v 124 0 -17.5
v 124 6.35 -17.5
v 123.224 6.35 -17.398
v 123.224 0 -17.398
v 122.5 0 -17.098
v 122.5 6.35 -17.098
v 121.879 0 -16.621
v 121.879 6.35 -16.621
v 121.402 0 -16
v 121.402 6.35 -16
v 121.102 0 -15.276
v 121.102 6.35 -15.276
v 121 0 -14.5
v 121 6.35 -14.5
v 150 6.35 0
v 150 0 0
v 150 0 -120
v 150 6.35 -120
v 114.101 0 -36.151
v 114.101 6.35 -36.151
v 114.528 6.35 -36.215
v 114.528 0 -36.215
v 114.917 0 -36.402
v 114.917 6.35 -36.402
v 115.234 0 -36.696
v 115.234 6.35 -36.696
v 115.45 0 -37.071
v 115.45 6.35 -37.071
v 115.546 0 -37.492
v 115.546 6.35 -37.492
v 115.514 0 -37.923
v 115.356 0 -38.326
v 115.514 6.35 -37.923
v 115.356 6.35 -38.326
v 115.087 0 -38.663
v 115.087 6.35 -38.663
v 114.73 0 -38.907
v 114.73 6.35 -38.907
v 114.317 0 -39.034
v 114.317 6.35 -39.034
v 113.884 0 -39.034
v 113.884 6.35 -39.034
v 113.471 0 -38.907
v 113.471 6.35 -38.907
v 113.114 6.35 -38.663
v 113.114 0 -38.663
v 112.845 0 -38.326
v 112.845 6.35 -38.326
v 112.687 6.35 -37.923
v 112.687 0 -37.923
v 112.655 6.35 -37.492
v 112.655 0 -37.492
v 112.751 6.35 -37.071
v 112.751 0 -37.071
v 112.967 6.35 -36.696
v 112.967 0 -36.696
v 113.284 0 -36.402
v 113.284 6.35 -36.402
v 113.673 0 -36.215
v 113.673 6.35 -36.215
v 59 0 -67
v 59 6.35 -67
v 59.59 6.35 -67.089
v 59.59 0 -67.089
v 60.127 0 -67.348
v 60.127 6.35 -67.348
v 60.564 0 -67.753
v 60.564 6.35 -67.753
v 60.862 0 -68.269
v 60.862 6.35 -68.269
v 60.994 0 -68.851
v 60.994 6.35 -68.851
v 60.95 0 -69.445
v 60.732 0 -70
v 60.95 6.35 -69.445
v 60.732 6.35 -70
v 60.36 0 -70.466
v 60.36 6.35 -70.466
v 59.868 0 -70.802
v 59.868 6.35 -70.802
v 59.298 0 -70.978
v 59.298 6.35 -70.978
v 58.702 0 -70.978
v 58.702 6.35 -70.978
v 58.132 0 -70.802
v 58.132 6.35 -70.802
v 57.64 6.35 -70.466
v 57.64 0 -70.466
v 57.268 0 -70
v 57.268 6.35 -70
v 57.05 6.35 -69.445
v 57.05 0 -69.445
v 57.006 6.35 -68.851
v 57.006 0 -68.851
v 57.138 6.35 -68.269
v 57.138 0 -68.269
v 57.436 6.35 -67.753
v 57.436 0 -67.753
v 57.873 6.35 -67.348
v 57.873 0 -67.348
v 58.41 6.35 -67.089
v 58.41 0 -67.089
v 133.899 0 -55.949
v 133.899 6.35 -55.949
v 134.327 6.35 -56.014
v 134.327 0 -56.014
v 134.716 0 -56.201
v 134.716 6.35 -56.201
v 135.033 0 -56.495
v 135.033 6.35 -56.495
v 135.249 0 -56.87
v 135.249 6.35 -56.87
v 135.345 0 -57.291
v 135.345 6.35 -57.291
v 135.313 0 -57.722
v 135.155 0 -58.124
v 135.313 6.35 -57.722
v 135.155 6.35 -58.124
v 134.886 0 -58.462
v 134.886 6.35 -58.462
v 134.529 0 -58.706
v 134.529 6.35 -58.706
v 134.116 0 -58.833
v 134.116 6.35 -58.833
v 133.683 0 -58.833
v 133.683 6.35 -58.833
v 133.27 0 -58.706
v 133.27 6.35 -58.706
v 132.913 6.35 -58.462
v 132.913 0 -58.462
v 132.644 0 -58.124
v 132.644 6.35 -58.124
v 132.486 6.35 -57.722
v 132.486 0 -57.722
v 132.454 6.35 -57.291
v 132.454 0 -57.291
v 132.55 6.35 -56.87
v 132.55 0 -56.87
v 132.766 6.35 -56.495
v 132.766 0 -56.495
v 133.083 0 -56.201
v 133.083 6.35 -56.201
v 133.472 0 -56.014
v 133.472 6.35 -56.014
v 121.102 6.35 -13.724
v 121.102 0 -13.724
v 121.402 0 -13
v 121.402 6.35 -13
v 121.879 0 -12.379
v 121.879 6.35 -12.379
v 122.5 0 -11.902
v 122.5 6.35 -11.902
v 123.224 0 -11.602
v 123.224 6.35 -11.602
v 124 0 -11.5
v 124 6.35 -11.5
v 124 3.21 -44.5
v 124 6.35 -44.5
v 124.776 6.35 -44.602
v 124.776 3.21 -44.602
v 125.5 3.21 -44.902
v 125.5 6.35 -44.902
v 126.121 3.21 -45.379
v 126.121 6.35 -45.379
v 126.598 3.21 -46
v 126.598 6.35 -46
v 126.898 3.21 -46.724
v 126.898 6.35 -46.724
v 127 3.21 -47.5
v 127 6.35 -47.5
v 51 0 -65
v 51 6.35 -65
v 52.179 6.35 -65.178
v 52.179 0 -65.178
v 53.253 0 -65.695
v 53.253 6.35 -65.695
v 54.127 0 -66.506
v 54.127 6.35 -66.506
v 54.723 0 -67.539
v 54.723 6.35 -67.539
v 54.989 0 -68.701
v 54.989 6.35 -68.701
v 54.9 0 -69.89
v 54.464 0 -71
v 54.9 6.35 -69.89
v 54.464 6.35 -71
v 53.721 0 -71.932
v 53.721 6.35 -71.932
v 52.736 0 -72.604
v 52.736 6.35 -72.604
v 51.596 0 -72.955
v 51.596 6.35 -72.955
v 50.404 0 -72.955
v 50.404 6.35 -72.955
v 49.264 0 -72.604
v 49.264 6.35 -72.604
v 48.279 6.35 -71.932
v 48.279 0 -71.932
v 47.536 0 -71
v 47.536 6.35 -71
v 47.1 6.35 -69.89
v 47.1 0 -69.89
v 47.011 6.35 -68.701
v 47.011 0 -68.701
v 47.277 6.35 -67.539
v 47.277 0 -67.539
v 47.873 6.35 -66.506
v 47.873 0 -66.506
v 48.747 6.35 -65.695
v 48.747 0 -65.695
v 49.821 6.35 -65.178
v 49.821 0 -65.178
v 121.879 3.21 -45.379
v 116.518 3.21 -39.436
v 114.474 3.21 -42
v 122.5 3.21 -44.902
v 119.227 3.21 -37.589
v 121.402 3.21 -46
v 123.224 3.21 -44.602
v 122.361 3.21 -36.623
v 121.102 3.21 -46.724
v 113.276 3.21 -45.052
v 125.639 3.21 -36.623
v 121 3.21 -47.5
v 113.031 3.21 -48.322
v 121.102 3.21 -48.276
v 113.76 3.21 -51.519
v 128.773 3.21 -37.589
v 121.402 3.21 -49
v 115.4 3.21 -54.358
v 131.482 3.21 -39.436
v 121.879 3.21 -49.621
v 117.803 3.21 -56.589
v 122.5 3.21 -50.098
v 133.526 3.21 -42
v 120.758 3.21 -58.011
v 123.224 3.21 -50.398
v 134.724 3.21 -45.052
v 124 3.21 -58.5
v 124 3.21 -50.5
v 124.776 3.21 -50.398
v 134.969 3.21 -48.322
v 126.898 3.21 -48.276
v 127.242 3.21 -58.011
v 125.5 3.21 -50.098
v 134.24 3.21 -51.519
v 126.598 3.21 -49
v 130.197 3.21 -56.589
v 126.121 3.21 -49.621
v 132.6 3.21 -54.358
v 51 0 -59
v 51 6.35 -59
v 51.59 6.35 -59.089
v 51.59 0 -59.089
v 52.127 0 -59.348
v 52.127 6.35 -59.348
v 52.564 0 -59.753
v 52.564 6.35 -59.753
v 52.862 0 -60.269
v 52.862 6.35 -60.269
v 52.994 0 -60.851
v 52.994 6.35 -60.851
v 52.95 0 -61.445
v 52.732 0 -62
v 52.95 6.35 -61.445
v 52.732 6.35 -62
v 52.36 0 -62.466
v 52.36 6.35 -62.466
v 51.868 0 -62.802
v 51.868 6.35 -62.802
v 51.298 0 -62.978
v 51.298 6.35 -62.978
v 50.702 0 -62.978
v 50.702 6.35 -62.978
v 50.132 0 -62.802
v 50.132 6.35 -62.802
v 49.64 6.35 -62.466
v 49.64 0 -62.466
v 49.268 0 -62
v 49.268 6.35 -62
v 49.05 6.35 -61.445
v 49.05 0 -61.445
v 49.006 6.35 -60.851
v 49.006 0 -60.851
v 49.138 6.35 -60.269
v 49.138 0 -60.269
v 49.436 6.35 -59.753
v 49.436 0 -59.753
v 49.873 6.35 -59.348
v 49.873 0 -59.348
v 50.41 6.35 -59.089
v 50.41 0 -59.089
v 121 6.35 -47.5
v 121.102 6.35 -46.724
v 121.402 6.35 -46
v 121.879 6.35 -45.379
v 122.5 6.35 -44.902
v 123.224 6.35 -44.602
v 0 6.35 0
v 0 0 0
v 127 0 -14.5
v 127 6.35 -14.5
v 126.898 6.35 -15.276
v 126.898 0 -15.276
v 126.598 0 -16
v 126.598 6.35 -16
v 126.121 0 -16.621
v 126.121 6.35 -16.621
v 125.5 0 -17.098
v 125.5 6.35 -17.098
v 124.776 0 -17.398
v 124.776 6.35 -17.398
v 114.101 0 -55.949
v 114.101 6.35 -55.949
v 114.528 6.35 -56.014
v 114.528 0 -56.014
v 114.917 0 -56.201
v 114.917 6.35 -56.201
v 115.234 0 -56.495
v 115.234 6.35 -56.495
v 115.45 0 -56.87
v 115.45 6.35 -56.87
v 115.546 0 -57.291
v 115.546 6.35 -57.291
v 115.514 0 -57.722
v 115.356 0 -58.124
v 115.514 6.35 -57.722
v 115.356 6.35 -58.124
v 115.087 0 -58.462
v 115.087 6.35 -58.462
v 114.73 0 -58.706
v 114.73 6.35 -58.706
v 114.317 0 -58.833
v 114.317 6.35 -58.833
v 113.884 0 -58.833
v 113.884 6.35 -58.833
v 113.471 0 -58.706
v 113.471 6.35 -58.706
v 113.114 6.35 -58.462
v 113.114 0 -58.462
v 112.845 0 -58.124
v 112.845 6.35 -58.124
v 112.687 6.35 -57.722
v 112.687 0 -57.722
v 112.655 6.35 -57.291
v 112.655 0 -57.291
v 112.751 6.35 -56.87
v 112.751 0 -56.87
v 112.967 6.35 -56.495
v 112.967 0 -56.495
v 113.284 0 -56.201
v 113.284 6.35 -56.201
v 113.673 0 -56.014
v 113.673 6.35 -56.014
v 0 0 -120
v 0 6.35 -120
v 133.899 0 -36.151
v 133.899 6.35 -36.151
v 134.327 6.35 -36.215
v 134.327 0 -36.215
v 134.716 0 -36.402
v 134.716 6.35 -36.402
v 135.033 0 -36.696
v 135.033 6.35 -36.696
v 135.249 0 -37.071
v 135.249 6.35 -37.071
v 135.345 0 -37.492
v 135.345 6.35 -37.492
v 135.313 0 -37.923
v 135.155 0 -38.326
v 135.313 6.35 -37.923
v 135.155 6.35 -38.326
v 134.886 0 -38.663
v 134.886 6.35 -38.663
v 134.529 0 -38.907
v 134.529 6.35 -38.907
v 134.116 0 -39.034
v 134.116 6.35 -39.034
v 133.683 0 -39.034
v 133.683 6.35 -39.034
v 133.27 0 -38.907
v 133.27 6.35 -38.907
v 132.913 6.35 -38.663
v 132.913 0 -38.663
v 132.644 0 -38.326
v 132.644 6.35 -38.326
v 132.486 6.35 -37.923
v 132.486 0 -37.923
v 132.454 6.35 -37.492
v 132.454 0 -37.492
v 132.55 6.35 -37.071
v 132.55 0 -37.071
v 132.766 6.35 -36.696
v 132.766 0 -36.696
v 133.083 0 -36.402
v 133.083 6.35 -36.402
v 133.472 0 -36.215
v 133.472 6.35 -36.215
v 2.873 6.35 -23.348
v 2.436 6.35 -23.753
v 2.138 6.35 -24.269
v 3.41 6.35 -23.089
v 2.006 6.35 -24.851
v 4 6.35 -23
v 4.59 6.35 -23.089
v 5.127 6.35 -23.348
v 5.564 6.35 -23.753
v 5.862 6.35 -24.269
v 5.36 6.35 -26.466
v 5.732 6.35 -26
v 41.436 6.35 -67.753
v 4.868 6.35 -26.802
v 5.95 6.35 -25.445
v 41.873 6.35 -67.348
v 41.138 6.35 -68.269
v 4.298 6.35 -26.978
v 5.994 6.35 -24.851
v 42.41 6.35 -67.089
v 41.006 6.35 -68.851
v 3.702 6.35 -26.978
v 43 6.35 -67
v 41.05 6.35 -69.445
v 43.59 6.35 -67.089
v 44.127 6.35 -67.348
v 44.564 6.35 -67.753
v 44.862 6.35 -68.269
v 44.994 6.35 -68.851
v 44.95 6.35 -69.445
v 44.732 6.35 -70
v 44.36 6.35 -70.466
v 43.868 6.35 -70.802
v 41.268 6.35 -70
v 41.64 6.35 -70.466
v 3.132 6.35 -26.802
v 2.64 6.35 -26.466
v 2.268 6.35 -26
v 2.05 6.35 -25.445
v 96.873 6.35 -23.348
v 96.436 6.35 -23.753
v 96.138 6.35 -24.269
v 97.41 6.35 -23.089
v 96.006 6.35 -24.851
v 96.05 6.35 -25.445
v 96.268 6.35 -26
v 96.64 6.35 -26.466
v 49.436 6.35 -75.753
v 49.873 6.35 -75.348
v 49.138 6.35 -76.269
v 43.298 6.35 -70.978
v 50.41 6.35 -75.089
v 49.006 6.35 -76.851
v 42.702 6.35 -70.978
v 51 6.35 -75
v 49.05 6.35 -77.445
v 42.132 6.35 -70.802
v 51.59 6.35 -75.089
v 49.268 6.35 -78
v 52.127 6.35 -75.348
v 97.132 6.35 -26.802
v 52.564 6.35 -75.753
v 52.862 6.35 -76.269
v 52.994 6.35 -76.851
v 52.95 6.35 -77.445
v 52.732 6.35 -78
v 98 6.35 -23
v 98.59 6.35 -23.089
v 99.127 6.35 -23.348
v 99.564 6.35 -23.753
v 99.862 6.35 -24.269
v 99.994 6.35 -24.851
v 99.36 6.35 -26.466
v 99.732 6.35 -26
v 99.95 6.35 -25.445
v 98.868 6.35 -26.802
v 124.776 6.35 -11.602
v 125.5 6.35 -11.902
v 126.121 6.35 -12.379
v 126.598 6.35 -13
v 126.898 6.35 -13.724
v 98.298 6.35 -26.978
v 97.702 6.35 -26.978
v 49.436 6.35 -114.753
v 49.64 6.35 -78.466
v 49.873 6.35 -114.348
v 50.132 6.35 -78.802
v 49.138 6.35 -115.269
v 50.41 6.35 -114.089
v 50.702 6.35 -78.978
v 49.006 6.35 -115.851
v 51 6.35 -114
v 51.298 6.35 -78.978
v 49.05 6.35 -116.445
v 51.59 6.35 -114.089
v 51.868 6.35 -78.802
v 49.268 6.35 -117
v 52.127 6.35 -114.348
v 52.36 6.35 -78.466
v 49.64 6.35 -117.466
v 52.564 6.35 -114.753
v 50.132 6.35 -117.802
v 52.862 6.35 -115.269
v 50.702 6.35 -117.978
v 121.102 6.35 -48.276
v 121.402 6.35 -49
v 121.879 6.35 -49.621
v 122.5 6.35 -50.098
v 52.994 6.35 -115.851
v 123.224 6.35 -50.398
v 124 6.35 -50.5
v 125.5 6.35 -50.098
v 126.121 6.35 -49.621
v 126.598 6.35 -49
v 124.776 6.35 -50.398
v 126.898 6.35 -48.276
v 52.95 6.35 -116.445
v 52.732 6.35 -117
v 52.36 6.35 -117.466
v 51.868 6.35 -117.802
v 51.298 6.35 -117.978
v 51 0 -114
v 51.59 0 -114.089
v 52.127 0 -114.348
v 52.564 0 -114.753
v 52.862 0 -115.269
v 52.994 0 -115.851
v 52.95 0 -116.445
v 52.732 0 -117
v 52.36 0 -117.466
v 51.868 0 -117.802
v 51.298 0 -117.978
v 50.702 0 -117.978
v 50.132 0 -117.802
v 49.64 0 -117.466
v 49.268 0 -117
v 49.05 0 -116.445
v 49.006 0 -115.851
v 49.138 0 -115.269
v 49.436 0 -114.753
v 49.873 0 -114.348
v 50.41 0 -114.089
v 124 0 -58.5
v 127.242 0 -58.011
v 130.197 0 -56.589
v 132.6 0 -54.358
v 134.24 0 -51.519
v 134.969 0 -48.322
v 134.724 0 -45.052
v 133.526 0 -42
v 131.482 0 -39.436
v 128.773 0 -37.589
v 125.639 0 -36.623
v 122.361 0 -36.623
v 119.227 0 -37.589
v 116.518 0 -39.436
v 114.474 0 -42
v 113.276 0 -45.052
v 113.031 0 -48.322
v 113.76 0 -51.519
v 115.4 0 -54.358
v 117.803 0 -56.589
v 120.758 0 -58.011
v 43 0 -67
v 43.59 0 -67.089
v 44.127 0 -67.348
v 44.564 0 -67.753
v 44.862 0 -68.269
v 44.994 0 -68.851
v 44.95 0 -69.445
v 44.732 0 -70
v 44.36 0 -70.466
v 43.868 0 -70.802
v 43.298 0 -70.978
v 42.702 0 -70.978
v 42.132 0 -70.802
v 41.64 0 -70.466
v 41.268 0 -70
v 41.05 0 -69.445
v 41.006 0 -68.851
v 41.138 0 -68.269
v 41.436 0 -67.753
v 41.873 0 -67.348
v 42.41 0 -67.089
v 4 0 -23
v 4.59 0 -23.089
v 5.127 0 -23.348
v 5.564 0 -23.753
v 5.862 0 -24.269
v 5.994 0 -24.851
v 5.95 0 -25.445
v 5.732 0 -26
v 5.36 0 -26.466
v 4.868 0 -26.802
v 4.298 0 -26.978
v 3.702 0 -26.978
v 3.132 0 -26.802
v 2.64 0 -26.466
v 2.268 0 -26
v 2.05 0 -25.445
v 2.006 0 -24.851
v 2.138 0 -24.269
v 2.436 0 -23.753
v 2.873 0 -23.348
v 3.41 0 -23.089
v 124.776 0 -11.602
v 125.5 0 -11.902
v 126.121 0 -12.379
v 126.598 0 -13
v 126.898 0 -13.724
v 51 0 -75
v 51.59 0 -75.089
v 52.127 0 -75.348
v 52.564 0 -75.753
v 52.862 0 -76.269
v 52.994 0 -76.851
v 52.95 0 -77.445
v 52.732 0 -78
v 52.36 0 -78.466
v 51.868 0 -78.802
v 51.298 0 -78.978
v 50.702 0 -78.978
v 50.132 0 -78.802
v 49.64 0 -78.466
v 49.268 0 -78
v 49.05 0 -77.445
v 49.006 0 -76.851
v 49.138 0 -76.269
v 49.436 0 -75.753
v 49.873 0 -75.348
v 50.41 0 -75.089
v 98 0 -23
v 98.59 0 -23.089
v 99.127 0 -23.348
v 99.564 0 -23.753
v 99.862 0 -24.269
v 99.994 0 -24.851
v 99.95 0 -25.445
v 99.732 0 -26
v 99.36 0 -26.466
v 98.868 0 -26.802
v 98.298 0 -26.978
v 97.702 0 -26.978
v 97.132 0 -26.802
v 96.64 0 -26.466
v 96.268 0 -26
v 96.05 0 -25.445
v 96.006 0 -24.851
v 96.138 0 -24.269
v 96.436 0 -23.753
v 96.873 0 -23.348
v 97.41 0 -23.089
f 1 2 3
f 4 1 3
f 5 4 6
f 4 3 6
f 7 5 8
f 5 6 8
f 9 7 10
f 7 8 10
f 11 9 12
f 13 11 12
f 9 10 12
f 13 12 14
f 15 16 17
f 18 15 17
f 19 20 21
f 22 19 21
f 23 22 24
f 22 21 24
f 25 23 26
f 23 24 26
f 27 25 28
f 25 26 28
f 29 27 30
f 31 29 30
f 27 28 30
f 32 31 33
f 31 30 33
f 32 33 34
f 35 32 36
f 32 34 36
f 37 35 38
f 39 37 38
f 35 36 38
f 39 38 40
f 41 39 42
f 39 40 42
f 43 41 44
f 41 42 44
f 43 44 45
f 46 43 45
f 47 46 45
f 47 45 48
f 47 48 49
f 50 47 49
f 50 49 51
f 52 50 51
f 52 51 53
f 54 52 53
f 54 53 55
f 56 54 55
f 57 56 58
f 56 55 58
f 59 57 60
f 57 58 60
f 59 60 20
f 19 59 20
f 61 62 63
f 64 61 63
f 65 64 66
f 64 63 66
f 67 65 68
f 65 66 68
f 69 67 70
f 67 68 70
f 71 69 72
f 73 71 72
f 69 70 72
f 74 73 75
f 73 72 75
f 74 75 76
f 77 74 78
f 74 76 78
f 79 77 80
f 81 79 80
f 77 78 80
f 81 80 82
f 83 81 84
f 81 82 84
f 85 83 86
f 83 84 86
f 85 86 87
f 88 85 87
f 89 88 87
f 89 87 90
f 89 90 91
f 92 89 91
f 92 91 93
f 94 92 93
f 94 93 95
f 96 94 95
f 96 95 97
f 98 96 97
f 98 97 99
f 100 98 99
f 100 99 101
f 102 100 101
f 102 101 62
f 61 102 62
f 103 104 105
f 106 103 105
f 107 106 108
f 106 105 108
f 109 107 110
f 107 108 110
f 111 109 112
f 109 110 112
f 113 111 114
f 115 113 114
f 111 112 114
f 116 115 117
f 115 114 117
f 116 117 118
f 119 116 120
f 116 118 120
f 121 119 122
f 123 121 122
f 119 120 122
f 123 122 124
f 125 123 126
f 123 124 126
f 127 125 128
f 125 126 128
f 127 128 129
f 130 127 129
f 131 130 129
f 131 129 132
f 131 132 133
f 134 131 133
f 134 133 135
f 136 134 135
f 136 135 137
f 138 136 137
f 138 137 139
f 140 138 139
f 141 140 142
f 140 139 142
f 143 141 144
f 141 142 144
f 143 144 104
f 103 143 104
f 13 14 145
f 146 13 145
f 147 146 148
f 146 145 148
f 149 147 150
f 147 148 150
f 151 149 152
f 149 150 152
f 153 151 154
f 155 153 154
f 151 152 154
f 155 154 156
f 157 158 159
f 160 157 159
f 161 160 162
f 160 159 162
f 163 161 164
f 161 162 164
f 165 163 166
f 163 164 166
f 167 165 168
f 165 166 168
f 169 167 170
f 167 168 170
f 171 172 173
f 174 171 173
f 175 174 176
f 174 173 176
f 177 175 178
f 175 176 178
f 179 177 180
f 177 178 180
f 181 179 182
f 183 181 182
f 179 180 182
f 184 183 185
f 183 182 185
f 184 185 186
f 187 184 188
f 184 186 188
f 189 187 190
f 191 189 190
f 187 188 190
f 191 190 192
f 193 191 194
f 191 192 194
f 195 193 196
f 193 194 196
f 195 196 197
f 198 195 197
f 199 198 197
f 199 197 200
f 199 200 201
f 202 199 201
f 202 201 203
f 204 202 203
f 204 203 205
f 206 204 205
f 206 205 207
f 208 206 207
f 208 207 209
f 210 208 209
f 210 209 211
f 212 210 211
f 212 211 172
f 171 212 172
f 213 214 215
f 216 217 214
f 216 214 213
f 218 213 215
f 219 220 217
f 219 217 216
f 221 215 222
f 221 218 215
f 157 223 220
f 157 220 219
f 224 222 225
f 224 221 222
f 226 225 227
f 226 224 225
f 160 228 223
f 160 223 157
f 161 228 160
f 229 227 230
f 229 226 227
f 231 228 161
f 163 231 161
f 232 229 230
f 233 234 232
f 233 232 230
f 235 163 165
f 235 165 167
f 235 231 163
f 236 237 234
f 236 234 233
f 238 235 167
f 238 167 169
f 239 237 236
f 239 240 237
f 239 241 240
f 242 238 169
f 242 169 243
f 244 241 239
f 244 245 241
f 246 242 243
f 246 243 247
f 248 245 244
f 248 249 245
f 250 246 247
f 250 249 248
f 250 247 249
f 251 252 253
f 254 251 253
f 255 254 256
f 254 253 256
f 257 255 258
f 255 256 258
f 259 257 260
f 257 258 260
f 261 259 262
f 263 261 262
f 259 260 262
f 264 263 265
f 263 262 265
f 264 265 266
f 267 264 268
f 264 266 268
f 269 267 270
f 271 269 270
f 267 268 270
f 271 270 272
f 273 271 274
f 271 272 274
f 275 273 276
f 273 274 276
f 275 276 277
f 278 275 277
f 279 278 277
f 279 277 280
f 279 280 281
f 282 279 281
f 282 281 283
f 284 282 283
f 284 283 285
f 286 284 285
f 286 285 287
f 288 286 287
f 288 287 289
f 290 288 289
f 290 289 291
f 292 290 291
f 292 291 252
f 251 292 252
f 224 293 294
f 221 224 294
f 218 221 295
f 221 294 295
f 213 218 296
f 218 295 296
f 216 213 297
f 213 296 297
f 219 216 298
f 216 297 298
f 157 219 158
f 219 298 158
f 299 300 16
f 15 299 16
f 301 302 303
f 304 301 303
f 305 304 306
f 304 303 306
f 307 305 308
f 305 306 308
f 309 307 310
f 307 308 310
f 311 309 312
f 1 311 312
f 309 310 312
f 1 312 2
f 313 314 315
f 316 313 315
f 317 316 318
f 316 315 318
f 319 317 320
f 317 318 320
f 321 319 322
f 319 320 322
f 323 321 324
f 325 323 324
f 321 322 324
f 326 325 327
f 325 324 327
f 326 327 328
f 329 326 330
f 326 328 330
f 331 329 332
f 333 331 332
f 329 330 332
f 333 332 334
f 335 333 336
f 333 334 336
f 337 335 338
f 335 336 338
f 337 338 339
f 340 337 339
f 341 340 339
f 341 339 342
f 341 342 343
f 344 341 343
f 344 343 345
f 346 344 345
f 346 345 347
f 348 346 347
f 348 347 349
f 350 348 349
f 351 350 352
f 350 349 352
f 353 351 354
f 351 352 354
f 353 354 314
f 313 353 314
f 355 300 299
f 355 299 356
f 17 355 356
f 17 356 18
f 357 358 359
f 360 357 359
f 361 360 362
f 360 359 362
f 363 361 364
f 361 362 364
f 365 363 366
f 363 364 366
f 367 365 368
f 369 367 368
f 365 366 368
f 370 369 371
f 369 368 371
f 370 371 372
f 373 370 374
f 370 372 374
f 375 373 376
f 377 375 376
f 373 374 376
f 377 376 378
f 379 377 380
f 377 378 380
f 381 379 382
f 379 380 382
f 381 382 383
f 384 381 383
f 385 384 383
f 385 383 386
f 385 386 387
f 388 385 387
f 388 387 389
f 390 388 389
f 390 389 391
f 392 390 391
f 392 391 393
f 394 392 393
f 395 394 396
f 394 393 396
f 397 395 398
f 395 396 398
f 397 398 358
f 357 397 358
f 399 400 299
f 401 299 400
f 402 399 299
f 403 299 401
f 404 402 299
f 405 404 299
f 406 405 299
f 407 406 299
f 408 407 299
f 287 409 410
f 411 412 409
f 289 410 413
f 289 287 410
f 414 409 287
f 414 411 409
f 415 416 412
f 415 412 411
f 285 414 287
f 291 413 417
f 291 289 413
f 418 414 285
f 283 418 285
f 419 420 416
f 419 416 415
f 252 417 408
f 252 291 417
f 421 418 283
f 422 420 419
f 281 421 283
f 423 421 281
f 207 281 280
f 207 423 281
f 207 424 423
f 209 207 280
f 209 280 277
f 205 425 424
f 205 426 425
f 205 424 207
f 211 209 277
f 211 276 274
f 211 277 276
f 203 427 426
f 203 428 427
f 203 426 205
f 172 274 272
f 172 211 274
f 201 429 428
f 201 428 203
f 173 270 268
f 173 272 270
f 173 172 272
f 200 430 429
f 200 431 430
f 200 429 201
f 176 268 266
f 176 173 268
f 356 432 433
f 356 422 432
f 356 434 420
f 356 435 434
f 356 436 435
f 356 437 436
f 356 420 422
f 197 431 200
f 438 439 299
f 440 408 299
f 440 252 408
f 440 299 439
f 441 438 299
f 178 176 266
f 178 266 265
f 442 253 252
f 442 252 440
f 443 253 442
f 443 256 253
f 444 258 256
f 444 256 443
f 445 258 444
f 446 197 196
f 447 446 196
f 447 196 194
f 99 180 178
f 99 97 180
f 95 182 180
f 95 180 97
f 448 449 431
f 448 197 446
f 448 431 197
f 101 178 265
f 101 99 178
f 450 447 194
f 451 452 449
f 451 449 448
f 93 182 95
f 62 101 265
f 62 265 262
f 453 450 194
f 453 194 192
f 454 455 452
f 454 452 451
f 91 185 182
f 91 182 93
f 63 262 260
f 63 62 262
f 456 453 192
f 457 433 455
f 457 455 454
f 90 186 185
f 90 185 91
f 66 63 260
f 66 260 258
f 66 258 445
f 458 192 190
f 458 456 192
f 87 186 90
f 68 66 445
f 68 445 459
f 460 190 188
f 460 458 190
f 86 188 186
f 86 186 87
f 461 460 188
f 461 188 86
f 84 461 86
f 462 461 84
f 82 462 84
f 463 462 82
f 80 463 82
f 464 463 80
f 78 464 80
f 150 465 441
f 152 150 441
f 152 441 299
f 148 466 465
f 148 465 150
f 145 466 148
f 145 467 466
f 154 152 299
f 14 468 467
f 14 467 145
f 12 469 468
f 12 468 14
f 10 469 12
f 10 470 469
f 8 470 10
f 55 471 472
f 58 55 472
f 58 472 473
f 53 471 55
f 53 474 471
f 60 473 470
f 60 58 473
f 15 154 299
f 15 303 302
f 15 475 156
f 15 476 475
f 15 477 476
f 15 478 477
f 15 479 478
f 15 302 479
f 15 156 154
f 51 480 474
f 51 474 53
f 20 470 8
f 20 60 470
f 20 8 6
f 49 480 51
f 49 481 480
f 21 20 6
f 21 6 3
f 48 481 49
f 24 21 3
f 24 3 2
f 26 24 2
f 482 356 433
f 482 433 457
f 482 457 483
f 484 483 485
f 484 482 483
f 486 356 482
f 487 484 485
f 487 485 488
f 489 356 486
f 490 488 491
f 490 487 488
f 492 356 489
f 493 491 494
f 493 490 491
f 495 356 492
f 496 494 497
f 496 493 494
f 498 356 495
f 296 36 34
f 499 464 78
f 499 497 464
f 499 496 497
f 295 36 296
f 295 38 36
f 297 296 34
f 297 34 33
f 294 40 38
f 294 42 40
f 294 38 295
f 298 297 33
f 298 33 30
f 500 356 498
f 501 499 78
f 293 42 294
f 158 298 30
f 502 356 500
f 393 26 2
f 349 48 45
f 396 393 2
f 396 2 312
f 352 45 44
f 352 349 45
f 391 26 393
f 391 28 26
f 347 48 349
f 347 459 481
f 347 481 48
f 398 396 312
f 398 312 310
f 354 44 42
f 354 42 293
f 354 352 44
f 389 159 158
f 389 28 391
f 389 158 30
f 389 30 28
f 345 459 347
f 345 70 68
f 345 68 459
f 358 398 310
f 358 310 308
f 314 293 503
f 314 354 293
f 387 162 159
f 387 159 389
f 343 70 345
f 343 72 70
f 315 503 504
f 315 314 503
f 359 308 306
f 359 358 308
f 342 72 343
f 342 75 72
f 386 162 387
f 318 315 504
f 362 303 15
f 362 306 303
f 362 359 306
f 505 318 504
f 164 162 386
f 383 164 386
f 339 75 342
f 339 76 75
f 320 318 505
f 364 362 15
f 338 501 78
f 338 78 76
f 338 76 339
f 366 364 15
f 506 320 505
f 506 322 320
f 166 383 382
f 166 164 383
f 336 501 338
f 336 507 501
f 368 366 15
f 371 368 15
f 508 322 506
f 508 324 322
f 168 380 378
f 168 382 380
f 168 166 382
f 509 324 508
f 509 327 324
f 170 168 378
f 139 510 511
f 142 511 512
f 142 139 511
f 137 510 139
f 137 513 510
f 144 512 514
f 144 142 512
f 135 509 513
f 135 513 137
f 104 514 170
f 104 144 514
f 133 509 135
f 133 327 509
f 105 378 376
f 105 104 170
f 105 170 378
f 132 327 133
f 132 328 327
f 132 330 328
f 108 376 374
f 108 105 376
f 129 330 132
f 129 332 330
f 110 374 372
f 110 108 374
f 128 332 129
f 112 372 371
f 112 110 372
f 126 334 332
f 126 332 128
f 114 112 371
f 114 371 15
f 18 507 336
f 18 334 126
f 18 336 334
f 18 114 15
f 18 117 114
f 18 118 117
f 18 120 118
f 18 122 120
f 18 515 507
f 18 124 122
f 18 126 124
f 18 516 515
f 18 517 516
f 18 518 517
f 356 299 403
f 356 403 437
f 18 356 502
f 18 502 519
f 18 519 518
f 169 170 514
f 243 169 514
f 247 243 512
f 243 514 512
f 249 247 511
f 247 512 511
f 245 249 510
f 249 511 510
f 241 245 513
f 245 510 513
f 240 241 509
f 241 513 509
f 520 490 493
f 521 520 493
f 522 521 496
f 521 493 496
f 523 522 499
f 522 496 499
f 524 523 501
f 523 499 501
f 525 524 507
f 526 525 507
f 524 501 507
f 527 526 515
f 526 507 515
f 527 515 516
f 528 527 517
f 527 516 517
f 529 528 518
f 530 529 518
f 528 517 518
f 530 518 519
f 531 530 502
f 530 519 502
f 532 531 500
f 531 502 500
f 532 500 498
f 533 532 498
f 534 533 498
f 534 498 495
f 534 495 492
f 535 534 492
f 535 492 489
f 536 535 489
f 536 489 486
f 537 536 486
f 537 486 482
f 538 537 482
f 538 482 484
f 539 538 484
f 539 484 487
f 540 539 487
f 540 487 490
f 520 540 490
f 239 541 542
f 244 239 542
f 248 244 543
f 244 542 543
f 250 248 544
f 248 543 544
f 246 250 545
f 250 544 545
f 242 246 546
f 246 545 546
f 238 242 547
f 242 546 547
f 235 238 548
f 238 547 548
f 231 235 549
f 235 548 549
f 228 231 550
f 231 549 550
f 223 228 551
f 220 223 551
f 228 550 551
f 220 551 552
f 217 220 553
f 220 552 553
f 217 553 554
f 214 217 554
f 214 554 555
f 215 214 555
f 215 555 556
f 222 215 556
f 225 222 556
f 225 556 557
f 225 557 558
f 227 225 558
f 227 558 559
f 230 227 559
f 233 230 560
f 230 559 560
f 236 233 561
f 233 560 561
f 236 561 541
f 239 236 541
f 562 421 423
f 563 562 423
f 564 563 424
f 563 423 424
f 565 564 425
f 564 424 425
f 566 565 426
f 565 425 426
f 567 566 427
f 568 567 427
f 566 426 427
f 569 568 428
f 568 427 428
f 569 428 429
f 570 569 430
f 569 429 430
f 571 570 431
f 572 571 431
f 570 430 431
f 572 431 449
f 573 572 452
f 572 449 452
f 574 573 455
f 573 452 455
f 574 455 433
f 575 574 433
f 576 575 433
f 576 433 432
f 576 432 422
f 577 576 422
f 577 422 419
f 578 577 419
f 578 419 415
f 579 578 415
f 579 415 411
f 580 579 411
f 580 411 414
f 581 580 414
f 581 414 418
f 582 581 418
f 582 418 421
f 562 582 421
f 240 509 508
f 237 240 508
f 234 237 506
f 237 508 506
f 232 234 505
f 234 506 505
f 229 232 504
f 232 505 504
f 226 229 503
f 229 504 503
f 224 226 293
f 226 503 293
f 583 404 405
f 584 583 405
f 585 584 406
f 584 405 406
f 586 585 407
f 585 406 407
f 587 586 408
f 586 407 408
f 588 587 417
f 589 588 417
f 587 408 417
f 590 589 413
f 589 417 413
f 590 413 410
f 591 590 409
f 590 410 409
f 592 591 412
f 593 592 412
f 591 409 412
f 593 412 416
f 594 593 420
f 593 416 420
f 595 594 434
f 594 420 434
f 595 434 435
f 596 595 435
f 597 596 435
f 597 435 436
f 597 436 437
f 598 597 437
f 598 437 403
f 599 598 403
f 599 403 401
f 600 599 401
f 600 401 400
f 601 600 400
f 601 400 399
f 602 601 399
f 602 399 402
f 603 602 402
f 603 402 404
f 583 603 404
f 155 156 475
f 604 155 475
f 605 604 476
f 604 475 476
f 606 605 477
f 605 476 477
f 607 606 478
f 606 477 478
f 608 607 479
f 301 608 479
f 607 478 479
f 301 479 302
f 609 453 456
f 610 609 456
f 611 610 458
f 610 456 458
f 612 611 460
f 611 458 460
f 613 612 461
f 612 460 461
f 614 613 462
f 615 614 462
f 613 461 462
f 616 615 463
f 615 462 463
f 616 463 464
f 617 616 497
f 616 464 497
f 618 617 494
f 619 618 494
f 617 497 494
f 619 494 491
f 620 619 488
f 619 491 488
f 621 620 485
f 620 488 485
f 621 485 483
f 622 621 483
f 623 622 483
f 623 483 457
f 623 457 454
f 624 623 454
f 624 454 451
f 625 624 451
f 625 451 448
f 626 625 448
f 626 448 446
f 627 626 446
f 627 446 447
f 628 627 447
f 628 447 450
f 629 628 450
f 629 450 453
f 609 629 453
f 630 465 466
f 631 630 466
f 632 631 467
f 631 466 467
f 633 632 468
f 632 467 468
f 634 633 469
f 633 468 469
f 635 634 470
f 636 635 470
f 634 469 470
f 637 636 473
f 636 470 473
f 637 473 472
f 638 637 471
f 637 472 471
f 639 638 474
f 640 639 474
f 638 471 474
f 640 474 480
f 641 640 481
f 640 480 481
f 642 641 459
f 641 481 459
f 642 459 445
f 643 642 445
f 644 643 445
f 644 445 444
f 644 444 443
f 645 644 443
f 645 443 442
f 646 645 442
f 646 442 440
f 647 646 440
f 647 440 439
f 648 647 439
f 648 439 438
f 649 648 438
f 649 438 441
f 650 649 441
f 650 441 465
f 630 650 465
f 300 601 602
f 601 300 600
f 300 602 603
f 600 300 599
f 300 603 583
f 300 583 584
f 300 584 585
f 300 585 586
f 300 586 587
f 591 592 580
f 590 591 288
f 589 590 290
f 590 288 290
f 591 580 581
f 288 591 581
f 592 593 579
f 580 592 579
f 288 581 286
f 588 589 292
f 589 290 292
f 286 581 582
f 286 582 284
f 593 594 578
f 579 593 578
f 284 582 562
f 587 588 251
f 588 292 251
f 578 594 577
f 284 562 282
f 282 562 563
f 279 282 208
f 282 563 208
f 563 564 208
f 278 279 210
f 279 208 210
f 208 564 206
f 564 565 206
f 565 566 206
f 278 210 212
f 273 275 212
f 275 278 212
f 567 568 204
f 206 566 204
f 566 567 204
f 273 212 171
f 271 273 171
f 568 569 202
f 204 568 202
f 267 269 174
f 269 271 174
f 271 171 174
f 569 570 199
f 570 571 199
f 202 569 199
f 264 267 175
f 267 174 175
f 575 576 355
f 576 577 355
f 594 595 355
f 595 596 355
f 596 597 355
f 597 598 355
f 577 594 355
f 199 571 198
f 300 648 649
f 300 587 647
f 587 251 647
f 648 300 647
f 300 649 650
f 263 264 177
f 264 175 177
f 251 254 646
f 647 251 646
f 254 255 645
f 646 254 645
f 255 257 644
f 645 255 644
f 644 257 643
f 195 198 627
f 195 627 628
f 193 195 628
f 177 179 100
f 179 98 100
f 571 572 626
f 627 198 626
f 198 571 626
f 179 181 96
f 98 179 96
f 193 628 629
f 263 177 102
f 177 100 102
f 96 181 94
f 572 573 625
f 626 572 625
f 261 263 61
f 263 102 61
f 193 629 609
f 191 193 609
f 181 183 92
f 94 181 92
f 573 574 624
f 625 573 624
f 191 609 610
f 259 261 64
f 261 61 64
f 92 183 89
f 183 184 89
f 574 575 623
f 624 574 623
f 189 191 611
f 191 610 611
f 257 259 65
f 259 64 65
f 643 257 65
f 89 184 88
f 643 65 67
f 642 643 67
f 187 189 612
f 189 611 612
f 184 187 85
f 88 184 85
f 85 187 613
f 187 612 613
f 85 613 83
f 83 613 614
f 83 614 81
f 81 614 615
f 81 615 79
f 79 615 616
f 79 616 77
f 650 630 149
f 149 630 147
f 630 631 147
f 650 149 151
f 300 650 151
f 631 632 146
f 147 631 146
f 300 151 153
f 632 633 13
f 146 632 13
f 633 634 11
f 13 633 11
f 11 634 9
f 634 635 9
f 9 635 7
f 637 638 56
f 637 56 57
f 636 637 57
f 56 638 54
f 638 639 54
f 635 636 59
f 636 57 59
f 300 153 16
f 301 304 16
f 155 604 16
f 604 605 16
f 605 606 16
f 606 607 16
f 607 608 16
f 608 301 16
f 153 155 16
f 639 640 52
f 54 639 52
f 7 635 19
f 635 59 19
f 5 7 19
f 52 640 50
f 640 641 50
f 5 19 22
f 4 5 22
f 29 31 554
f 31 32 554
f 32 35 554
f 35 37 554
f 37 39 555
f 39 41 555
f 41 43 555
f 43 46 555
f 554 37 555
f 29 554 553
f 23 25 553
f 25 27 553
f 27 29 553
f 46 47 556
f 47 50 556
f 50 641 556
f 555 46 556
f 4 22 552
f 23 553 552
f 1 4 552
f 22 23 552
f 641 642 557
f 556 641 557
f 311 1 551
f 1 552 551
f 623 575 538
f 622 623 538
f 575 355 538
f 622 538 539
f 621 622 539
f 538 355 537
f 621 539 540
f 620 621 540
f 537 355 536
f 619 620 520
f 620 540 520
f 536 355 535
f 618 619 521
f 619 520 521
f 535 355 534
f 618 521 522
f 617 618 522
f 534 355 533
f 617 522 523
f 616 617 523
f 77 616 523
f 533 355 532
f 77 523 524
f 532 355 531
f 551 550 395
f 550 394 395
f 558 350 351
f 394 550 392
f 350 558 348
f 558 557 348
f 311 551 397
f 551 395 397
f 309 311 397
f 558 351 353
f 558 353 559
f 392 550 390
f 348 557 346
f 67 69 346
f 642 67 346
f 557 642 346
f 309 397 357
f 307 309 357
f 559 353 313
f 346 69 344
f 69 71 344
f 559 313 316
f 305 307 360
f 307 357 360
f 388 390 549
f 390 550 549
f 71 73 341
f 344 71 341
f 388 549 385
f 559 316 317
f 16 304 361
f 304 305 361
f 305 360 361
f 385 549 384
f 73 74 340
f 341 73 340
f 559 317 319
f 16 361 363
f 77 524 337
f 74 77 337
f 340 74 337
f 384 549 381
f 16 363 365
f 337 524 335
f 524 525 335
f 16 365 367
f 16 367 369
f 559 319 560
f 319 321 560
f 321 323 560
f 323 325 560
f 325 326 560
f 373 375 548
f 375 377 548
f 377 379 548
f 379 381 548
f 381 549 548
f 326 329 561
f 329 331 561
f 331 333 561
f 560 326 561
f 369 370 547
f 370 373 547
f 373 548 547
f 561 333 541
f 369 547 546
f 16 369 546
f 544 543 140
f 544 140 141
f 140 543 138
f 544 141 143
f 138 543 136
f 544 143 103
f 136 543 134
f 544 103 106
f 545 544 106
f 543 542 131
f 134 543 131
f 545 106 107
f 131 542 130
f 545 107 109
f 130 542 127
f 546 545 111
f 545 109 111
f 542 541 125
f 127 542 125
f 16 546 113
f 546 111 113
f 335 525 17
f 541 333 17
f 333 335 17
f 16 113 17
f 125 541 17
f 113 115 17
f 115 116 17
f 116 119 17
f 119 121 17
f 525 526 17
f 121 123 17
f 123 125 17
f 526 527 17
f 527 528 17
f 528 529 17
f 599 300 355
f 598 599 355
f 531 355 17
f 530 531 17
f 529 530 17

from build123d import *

# Parameters (mm, degrees)
SKETCH1_W           = 150
SKETCH1_H           = 120
BOSS_EXTRUDE1_DEPTH = 6.35
SKETCH2_R           = 2
SKETCH2_R_2         = 4
CUT_EXTRUDE1_DEPTH  = 10
SKETCH3_R           = 11
CUT_EXTRUDE2_DEPTH  = 3.21
SKETCH4_R           = 1.45
CUT_EXTRUDE3_DEPTH  = 6.35


with BuildPart() as part:
    # Sketch1 → Boss-Extrude1 (new body)
    with BuildSketch(Plane(origin=(0, 0, 0), x_dir=(1, 0, 0), z_dir=(0, 1, 0))):
        with Locations((75, 60)):
            Rectangle(SKETCH1_W, SKETCH1_H)
    extrude(amount=BOSS_EXTRUDE1_DEPTH)

    # Sketch2 → Cut-Extrude1 (cut)
    with BuildSketch(Plane(origin=(0, 6.35, 0), x_dir=(1, 0, 0), z_dir=(0, 1, 0))):
        with Locations(Location((51, 116, 0), (0, 0, 270))):
            Circle(SKETCH2_R)
        with Locations(Location((4, 25, 0), (0, 0, 270))):
            Circle(SKETCH2_R)
        with Locations(Location((98, 25, 0), (0, 0, 270))):
            Circle(SKETCH2_R)
        with BuildLine():
            ThreePointArc((127, 14.5), (126.121320344, 16.621320344), (124, 17.5))
            Line((124, 17.5), (124, 14.5))
            Line((124, 14.5), (124, 11.5))
            ThreePointArc((124, 11.5), (126.121320344, 12.378679656), (127, 14.5))
        make_face()
        with BuildLine():
            Line((124, 14.5), (124, 17.5))
            ThreePointArc((124, 17.5), (121.878679656, 16.621320344), (121, 14.5))
            Line((121, 14.5), (124, 14.5))
        make_face()
        with BuildLine():
            Line((124, 14.5), (121, 14.5))
            ThreePointArc((121, 14.5), (121.878679656, 12.378679656), (124, 11.5))
            Line((124, 11.5), (124, 14.5))
        make_face()
        with BuildLine():
            ThreePointArc((121, 47.5), (121.878679656, 45.378679656), (124, 44.5))
            Line((124, 44.5), (124, 47.5))
            Line((124, 47.5), (121, 47.5))
        make_face()
        with BuildLine():
            ThreePointArc((124, 50.5), (121.878679656, 49.621320344), (121, 47.5))
            Line((121, 47.5), (124, 47.5))
            Line((124, 47.5), (124, 50.5))
        make_face()
        with BuildLine():
            Line((124, 47.5), (124, 44.5))
            ThreePointArc((124, 44.5), (126.121320344, 45.378679656), (127, 47.5))
            ThreePointArc((127, 47.5), (126.121320344, 49.621320344), (124, 50.5))
            Line((124, 50.5), (124, 47.5))
        make_face()
        with Locations(Location((51, 77, 0), (0, 0, 270))):
            Circle(SKETCH2_R)
        with Locations(Location((43, 69, 0), (0, 0, 270))):
            Circle(SKETCH2_R)
        with Locations(Location((51, 69, 0), (0, 0, 270))):
            Circle(SKETCH2_R_2)
        with Locations(Location((59, 69, 0), (0, 0, 270))):
            Circle(SKETCH2_R)
        with Locations(Location((51, 61, 0), (0, 0, 270))):
            Circle(SKETCH2_R)
    extrude(amount=-CUT_EXTRUDE1_DEPTH, mode=Mode.SUBTRACT)

    # Sketch3 → Cut-Extrude2 (cut)
    with BuildSketch(Plane.XZ):
        with Locations(Location((124, -47.5, 0), (0, 0, 270))):
            Circle(SKETCH3_R)
    extrude(amount=-CUT_EXTRUDE2_DEPTH, mode=Mode.SUBTRACT)

    # Sketch4 → Cut-Extrude3 (cut)
    with BuildSketch(Plane(origin=(0, 6.35, 0), x_dir=(1, 0, 0), z_dir=(0, 1, 0))):
        with Locations(Location((133.899494937, 57.399494937, 0), (0, 0, 270))):
            Circle(SKETCH4_R)
        with Locations(Location((114.100505063, 37.600505063, 0), (0, 0, 270))):
            Circle(SKETCH4_R)
        with Locations(Location((133.899494937, 37.600505063, 0), (0, 0, 270))):
            Circle(SKETCH4_R)
        with Locations(Location((114.100505063, 57.399494937, 0), (0, 0, 270))):
            Circle(SKETCH4_R)
    extrude(amount=-CUT_EXTRUDE3_DEPTH, mode=Mode.SUBTRACT)


solid = part.part
